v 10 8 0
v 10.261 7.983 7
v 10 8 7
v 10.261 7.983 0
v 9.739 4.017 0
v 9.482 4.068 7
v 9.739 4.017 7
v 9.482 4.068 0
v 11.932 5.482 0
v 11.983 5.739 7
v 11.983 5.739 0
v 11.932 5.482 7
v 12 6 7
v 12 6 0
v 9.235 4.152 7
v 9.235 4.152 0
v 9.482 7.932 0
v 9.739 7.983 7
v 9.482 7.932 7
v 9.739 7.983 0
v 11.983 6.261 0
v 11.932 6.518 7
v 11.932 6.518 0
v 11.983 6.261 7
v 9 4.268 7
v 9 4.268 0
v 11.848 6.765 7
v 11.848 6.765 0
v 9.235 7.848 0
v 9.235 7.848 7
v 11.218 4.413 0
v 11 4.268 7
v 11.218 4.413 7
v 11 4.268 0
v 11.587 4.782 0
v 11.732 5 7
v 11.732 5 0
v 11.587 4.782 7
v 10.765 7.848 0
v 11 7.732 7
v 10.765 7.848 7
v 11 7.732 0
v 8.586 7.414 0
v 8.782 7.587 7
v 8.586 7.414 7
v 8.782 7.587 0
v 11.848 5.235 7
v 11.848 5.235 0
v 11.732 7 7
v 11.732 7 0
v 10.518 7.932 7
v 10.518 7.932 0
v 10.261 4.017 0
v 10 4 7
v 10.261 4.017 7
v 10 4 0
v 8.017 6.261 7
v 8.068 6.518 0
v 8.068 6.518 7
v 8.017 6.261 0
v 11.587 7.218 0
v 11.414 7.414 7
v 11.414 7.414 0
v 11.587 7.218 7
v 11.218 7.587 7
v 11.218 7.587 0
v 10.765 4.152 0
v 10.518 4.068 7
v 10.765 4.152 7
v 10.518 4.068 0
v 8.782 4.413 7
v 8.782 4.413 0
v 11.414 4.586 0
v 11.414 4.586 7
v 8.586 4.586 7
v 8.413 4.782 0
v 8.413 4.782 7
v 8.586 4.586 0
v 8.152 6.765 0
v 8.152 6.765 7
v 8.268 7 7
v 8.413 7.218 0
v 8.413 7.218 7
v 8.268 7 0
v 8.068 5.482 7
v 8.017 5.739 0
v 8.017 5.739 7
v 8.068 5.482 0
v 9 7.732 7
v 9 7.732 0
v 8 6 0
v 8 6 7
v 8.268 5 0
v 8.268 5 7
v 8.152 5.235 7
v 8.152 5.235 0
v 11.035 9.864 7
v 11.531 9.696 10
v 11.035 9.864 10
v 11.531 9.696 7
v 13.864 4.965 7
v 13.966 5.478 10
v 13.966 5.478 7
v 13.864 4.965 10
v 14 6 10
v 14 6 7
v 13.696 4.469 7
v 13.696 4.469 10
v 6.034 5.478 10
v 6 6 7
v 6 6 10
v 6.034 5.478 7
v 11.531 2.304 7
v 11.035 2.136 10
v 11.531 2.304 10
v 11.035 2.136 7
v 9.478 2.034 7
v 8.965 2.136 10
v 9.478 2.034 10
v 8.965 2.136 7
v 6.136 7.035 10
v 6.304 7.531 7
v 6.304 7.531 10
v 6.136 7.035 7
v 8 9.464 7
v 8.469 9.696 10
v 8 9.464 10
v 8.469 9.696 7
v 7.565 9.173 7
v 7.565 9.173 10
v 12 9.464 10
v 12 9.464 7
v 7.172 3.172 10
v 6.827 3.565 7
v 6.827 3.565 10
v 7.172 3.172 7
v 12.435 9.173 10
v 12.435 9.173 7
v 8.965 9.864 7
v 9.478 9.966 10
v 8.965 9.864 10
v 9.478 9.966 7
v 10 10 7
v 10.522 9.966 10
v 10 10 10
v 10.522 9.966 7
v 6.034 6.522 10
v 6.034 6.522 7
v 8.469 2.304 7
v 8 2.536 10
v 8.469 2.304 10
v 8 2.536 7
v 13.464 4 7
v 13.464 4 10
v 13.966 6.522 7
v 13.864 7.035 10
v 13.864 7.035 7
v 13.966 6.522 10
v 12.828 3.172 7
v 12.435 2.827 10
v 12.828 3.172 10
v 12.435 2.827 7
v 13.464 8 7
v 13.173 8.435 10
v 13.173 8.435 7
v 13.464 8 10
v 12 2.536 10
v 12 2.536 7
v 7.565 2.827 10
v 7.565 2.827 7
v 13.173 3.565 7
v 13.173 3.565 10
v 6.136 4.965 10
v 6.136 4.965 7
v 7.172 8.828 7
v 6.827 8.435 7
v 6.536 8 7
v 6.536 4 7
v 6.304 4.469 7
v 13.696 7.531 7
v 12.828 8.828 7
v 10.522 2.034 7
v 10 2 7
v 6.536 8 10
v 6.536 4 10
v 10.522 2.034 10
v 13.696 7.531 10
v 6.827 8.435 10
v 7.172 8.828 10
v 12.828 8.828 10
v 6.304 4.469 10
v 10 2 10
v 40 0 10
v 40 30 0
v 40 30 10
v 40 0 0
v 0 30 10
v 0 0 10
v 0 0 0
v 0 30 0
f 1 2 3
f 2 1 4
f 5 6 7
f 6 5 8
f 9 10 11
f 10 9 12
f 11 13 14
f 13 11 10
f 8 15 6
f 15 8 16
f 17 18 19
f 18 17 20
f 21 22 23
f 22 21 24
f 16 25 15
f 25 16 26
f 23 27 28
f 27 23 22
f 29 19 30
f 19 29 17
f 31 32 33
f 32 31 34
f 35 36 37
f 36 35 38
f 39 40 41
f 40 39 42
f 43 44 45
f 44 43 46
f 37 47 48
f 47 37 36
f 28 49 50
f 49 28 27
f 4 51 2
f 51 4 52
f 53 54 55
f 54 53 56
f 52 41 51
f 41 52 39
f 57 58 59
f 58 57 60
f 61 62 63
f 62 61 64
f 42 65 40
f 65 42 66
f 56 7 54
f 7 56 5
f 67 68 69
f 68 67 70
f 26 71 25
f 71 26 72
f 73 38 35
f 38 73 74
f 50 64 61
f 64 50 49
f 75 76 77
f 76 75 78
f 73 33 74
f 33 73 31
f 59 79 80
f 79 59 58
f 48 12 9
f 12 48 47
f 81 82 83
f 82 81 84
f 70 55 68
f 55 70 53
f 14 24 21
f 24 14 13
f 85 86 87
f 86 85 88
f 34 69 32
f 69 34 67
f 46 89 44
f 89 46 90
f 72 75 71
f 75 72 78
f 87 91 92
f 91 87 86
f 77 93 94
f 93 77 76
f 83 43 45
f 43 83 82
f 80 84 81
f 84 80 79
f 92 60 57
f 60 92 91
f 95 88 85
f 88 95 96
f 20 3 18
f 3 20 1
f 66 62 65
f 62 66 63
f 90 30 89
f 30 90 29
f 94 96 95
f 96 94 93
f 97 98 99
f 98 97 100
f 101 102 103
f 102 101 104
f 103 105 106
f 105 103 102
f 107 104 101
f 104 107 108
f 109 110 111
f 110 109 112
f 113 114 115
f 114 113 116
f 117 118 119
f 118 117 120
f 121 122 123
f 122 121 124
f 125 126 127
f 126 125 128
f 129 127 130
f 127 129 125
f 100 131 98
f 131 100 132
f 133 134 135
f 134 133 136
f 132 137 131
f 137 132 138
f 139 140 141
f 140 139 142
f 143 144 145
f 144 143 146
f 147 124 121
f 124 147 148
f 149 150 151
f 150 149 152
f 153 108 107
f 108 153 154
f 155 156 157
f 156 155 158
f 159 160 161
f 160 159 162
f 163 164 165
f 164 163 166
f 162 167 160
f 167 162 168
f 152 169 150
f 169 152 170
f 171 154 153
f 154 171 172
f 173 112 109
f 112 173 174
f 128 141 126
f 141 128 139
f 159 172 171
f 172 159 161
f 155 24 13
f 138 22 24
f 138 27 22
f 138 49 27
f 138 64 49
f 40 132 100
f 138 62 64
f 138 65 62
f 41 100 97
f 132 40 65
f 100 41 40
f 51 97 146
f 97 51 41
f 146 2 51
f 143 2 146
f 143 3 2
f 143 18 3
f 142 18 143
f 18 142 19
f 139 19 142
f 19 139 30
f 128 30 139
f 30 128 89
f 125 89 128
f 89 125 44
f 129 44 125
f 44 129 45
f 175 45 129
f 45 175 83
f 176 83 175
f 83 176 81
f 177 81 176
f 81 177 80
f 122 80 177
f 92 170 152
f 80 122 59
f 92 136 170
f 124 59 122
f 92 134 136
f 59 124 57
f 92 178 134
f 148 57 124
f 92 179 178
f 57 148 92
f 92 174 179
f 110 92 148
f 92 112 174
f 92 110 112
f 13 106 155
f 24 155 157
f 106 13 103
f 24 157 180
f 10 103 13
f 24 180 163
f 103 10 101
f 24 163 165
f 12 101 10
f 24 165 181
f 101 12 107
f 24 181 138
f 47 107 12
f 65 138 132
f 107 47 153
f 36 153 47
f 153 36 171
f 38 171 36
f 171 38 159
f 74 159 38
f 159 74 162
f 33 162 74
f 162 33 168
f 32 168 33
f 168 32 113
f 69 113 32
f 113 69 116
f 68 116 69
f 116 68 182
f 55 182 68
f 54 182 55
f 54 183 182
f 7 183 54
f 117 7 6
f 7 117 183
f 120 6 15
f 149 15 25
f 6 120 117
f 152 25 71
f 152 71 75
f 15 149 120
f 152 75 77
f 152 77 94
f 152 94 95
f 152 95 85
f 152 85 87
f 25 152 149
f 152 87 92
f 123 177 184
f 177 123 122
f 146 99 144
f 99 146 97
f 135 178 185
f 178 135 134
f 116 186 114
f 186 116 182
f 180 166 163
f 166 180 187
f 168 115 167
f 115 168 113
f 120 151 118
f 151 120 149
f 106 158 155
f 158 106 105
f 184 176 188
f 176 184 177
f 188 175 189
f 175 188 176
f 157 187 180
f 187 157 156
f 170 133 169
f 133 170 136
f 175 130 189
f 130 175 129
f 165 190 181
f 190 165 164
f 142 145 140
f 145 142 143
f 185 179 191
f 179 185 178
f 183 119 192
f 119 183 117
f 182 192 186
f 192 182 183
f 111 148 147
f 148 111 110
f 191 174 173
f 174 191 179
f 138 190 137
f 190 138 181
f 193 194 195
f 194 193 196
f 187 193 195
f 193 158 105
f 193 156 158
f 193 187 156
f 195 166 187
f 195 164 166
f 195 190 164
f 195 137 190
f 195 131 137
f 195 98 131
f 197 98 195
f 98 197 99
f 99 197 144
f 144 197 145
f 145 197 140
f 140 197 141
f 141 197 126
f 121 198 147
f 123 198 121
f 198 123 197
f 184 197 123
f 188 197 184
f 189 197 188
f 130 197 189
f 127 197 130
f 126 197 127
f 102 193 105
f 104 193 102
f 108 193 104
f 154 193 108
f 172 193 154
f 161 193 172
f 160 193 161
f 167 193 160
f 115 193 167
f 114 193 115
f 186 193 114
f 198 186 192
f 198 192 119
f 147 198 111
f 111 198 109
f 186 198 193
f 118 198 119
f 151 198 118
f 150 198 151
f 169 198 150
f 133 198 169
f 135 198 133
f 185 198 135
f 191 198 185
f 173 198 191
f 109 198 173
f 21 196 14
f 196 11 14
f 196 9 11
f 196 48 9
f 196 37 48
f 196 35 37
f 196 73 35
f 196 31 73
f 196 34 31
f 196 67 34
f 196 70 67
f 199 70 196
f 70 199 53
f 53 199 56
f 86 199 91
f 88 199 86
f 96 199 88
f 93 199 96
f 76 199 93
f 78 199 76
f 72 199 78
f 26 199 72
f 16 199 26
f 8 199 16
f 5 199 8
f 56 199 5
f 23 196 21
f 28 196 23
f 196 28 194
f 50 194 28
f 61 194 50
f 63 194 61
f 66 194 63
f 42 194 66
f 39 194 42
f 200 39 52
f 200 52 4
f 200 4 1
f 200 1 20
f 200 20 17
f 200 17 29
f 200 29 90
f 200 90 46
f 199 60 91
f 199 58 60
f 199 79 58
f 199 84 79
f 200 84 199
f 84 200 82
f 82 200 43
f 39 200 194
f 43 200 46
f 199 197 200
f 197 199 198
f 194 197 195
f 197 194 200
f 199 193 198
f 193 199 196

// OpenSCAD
// units=mm — generated by scad_emitter.py
// part=unnamed
$fn = 48;

difference() { cube([40, 30, 10]); union() { translate([10, 6, 10.5]) rotate([180, 0, 0]) cylinder(h=11, r=2, $fn=$fn); translate([10, 6, 10.5]) rotate([180, 0, 0]) cylinder(h=3.5, r=4, $fn=$fn); } }
